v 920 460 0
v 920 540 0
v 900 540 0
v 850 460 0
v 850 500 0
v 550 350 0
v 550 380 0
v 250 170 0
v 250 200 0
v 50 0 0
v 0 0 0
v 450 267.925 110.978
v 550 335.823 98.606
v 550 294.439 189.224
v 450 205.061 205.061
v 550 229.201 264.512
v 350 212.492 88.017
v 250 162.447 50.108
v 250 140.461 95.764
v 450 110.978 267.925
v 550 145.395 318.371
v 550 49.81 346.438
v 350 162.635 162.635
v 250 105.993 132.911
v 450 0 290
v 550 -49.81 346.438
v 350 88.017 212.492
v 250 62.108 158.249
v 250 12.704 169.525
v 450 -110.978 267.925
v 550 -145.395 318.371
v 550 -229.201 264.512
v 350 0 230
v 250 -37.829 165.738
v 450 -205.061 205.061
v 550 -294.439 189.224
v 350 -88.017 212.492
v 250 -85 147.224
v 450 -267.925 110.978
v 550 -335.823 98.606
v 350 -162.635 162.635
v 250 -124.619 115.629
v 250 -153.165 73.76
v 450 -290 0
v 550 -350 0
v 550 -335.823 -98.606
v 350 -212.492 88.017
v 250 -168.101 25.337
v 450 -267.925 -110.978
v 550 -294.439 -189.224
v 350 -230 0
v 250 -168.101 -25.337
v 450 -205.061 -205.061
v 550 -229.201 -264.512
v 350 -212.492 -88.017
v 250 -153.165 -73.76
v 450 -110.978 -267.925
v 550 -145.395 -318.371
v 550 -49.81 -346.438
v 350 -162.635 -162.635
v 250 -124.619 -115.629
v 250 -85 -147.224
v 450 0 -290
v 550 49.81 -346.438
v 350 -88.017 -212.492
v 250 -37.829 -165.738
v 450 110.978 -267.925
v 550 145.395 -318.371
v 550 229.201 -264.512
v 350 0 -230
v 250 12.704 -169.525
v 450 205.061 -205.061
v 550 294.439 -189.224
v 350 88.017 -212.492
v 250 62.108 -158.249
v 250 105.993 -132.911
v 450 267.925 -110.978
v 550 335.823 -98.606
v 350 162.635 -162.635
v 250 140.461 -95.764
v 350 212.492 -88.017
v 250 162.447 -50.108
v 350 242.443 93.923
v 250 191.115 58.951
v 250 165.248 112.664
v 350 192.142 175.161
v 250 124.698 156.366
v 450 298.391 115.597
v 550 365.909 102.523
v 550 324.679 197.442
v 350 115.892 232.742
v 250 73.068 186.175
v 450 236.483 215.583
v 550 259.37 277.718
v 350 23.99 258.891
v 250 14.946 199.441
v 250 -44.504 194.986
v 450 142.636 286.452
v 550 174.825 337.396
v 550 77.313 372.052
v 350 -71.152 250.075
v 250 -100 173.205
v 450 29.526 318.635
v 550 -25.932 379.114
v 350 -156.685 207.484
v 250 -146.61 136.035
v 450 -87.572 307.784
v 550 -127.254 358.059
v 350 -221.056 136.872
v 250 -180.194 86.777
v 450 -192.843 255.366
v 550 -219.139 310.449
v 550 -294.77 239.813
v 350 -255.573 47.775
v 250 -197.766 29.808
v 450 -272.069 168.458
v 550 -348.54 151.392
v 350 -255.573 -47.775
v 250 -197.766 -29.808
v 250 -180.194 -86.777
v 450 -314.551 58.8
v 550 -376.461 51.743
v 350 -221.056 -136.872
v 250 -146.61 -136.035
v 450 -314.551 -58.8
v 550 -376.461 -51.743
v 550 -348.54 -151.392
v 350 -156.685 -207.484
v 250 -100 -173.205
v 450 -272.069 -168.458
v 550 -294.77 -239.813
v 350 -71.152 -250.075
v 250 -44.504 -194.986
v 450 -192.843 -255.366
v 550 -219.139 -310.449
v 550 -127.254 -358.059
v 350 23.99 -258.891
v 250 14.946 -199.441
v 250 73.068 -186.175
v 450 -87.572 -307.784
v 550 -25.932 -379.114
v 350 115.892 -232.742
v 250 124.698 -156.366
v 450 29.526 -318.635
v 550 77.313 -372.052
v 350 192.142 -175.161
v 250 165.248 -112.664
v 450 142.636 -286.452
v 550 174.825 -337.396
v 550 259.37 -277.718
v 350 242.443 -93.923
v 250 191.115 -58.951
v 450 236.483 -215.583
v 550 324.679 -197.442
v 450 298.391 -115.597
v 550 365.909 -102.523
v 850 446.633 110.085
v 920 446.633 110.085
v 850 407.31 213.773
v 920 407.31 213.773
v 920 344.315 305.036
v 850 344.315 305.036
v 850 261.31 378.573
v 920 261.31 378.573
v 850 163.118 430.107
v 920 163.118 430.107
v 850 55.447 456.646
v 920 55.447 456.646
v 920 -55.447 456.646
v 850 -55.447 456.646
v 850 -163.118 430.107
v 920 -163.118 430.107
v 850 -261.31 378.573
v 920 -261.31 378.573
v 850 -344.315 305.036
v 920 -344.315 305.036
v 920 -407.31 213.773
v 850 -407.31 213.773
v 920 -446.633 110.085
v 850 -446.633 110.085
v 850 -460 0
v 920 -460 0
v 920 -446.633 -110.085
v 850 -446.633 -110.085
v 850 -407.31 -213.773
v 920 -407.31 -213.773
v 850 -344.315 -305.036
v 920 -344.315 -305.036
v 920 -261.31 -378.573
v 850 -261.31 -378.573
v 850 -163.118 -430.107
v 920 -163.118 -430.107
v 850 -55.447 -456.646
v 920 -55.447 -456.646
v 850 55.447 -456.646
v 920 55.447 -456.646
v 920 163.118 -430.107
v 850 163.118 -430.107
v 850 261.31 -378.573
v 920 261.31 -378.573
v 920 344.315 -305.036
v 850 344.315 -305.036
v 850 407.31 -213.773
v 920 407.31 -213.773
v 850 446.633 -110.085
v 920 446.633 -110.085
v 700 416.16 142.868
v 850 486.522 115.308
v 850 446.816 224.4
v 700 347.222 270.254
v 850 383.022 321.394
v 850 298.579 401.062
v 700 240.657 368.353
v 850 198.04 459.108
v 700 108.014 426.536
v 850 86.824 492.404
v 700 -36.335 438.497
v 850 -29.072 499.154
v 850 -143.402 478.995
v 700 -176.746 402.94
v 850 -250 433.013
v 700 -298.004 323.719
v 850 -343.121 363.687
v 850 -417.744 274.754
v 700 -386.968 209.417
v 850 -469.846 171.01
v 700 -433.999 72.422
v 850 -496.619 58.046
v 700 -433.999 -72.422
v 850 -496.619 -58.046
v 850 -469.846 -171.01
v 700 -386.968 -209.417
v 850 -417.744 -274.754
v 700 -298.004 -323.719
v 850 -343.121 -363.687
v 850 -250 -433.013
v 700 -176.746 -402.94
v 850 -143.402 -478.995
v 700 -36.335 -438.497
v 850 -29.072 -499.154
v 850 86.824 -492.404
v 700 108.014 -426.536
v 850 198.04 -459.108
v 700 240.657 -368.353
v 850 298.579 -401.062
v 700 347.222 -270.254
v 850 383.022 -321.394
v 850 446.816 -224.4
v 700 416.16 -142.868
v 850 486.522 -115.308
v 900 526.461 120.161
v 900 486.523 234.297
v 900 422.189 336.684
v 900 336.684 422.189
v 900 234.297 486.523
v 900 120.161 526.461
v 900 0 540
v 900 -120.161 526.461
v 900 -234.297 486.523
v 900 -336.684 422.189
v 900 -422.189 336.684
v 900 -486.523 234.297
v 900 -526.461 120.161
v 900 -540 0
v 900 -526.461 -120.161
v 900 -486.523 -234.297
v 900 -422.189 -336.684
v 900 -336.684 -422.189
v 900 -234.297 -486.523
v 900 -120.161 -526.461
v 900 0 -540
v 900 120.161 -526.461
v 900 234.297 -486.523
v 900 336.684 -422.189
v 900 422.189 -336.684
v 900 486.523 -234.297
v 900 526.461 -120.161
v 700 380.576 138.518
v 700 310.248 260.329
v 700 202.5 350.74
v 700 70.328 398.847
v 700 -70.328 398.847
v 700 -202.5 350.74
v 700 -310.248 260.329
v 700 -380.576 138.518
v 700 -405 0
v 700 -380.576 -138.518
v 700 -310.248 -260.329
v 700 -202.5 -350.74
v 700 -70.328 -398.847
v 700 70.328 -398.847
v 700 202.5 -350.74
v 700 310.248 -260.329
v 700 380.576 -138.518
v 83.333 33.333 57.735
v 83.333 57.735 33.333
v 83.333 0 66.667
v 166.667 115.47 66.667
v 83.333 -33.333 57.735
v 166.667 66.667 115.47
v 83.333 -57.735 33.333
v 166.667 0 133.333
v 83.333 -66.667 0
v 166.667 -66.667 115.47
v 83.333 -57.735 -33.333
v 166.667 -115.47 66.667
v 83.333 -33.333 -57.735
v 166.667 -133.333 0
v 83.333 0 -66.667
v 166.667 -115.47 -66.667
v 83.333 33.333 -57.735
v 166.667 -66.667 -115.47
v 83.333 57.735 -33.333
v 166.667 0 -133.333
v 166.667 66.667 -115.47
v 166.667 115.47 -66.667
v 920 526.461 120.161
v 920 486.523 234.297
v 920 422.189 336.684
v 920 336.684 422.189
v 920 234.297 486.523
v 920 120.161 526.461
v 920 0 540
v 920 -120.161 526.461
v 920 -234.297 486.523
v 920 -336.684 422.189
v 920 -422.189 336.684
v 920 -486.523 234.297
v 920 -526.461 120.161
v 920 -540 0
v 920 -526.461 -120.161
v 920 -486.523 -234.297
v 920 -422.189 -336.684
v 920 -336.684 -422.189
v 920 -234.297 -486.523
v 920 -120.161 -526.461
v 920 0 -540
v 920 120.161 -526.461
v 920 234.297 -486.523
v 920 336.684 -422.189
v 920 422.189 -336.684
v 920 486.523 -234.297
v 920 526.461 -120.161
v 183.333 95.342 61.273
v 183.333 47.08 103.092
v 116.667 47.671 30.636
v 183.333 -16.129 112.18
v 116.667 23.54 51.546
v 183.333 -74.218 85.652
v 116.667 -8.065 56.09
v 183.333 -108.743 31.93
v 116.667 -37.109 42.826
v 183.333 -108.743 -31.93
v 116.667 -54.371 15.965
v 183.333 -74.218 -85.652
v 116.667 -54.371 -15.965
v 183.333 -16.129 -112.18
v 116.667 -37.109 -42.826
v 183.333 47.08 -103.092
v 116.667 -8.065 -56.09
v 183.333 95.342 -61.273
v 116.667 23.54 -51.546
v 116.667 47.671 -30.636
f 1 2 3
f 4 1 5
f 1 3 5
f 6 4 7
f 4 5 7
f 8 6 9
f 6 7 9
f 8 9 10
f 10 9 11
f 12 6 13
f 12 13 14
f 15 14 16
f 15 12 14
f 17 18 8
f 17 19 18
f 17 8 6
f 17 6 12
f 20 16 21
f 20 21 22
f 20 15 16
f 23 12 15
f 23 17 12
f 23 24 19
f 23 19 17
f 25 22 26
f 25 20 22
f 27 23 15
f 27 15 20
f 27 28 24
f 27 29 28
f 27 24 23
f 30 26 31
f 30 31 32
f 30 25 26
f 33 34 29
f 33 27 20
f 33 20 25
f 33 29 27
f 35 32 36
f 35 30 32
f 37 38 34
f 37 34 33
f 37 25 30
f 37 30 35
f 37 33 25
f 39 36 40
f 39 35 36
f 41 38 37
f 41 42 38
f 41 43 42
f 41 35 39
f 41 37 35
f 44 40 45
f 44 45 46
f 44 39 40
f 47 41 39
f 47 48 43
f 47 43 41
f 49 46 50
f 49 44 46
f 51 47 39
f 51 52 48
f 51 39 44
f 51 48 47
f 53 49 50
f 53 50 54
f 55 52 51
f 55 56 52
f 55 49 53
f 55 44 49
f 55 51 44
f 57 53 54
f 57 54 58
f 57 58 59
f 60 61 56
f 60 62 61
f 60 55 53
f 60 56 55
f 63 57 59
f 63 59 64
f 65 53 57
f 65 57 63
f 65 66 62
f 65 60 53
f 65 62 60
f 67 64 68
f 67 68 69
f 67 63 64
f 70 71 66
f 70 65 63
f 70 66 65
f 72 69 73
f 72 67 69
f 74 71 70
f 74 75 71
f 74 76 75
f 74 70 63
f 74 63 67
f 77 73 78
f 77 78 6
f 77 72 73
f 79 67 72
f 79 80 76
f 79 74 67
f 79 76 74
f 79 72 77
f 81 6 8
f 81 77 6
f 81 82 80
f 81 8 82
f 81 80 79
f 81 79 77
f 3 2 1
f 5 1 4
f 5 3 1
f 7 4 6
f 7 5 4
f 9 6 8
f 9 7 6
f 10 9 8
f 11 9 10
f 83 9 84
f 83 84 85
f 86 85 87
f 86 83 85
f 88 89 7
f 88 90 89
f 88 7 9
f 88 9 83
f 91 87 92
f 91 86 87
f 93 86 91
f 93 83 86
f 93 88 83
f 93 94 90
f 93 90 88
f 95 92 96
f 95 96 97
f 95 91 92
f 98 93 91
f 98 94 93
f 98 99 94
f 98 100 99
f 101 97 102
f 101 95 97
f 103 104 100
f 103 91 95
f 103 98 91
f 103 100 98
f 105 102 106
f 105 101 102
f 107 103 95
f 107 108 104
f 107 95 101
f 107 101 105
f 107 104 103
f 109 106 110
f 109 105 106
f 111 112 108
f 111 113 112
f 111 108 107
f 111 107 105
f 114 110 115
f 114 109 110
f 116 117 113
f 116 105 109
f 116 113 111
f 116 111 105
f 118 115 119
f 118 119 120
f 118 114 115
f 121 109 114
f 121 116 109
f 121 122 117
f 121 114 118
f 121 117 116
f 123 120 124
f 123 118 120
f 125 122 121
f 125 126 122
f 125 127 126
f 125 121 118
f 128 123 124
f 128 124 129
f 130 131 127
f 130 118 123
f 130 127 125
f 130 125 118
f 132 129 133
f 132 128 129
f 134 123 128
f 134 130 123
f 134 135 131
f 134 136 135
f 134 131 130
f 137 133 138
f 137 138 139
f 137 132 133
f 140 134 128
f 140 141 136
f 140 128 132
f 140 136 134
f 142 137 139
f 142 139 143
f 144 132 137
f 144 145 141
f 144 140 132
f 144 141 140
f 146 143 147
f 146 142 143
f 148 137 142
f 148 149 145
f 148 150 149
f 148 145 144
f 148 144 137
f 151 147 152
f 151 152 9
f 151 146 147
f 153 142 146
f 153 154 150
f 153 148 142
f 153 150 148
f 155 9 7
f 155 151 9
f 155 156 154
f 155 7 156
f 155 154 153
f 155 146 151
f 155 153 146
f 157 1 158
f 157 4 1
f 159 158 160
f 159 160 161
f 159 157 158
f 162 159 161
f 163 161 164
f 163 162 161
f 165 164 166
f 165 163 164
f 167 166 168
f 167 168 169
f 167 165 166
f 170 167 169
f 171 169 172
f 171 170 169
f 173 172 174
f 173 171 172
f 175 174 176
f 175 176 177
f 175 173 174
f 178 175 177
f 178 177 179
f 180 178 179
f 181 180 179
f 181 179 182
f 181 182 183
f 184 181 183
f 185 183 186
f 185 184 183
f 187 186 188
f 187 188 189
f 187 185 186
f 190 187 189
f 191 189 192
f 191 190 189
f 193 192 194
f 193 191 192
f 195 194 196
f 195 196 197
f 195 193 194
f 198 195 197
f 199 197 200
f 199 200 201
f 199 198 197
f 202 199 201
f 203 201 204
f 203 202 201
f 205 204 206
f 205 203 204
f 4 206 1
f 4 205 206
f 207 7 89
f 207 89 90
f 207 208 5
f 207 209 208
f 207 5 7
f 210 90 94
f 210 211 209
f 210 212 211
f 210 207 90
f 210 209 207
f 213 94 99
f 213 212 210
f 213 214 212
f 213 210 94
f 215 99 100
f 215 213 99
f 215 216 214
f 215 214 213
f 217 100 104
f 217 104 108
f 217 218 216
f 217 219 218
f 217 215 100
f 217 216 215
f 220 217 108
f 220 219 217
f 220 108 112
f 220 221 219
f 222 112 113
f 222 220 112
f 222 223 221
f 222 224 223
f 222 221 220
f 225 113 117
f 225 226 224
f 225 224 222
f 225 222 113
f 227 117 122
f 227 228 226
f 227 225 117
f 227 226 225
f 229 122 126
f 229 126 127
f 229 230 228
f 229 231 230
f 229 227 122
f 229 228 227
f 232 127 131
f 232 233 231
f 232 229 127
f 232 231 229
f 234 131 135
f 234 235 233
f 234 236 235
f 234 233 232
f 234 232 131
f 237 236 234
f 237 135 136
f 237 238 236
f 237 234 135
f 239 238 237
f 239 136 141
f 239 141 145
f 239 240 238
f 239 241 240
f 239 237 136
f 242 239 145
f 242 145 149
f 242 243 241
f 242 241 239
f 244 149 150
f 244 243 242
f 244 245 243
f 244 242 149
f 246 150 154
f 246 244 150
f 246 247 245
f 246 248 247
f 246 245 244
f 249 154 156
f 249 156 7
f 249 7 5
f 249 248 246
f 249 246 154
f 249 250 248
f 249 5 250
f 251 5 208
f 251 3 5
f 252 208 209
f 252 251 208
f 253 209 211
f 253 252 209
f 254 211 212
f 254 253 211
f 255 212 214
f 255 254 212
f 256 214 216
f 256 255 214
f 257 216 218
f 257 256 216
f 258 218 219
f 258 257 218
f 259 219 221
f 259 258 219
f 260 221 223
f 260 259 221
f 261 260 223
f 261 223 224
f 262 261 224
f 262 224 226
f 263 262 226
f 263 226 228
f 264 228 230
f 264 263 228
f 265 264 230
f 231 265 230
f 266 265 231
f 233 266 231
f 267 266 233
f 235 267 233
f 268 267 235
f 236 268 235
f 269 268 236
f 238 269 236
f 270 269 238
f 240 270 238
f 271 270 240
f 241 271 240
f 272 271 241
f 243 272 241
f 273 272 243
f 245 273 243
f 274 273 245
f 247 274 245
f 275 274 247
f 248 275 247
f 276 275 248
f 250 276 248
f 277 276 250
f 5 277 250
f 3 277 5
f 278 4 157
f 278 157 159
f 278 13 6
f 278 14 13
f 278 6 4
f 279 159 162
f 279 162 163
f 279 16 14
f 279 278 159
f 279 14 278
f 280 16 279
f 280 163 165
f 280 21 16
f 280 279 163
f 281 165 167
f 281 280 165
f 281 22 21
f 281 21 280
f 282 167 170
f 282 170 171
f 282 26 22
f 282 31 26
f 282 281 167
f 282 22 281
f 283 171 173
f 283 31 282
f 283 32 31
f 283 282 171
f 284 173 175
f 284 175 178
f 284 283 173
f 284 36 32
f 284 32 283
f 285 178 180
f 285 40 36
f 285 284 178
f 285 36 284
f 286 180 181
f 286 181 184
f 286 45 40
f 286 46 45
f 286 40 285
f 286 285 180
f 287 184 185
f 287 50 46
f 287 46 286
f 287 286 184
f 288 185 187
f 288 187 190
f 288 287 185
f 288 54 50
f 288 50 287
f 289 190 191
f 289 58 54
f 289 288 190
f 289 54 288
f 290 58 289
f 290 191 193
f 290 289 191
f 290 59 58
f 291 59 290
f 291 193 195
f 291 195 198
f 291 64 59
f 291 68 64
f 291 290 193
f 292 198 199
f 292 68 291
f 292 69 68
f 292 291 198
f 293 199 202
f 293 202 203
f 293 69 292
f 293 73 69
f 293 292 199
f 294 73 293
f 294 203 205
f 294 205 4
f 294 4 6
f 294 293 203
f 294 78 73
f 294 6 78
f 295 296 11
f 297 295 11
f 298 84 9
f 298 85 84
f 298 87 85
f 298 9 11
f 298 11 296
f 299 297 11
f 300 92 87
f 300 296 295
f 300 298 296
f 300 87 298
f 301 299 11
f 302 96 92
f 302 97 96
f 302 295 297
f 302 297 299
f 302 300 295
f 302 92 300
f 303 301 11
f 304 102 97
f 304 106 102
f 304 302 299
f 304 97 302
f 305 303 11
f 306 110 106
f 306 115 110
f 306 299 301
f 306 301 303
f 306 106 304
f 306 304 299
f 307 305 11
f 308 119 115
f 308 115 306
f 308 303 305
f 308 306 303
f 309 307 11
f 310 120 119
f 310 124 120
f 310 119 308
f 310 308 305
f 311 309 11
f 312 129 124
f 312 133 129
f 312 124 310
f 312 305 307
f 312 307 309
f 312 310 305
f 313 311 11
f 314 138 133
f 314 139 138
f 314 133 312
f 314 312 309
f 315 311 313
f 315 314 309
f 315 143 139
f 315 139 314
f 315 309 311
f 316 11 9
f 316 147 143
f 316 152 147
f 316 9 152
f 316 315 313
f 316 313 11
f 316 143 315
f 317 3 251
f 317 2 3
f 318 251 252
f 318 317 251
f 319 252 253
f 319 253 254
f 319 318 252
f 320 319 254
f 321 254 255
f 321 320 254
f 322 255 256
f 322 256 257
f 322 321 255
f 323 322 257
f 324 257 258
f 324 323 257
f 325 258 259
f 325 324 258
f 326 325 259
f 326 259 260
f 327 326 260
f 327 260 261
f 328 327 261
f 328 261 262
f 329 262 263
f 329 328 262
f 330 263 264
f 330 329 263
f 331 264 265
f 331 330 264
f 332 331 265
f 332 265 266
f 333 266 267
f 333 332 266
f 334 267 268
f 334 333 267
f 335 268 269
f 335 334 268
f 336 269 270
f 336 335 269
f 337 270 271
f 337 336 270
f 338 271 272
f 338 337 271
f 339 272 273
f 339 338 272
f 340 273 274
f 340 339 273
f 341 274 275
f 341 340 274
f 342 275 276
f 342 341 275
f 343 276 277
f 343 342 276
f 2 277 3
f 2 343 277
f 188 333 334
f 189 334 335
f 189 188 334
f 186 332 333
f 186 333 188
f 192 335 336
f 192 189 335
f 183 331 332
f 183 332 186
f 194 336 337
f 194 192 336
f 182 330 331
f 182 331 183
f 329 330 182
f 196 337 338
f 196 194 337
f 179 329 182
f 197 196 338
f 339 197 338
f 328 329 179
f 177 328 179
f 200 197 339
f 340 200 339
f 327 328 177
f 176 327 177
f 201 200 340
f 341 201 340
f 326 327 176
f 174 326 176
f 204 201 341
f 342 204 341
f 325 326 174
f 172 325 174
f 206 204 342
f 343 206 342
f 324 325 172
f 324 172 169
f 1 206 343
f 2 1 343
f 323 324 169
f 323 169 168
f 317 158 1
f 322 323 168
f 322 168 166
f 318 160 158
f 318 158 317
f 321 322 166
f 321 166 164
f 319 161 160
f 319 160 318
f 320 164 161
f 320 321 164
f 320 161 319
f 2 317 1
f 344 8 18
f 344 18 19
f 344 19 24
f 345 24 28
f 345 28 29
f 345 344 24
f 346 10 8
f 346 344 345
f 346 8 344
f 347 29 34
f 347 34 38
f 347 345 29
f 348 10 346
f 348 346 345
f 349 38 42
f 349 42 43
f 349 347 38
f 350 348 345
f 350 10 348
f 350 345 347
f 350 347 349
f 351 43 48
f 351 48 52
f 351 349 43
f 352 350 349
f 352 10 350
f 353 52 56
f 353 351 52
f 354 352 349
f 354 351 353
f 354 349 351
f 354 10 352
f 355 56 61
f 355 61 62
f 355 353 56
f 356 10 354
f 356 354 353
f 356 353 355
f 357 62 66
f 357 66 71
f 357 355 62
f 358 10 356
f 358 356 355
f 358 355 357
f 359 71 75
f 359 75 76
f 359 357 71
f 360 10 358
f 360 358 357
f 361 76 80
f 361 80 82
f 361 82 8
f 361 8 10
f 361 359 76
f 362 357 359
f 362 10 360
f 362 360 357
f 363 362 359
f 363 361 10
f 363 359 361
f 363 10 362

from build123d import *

# Parameters (mm, degrees)
REVOLVE1_ANGLE = 359.999999589


with BuildPart() as part:
    # Sketch1 → Revolve1 (revolve)
    with BuildSketch(Plane.XY):
        Polygon((0, 0), (250, 200), (550, 380), (850, 500), (900, 540), (920, 540), (920, 460), (850, 460), (550, 350), (250, 170), (50, 0), align=None)
    revolve(axis=Axis((0, 0, 0), (1, 0, 0)), revolution_arc=REVOLVE1_ANGLE)


solid = part.part
